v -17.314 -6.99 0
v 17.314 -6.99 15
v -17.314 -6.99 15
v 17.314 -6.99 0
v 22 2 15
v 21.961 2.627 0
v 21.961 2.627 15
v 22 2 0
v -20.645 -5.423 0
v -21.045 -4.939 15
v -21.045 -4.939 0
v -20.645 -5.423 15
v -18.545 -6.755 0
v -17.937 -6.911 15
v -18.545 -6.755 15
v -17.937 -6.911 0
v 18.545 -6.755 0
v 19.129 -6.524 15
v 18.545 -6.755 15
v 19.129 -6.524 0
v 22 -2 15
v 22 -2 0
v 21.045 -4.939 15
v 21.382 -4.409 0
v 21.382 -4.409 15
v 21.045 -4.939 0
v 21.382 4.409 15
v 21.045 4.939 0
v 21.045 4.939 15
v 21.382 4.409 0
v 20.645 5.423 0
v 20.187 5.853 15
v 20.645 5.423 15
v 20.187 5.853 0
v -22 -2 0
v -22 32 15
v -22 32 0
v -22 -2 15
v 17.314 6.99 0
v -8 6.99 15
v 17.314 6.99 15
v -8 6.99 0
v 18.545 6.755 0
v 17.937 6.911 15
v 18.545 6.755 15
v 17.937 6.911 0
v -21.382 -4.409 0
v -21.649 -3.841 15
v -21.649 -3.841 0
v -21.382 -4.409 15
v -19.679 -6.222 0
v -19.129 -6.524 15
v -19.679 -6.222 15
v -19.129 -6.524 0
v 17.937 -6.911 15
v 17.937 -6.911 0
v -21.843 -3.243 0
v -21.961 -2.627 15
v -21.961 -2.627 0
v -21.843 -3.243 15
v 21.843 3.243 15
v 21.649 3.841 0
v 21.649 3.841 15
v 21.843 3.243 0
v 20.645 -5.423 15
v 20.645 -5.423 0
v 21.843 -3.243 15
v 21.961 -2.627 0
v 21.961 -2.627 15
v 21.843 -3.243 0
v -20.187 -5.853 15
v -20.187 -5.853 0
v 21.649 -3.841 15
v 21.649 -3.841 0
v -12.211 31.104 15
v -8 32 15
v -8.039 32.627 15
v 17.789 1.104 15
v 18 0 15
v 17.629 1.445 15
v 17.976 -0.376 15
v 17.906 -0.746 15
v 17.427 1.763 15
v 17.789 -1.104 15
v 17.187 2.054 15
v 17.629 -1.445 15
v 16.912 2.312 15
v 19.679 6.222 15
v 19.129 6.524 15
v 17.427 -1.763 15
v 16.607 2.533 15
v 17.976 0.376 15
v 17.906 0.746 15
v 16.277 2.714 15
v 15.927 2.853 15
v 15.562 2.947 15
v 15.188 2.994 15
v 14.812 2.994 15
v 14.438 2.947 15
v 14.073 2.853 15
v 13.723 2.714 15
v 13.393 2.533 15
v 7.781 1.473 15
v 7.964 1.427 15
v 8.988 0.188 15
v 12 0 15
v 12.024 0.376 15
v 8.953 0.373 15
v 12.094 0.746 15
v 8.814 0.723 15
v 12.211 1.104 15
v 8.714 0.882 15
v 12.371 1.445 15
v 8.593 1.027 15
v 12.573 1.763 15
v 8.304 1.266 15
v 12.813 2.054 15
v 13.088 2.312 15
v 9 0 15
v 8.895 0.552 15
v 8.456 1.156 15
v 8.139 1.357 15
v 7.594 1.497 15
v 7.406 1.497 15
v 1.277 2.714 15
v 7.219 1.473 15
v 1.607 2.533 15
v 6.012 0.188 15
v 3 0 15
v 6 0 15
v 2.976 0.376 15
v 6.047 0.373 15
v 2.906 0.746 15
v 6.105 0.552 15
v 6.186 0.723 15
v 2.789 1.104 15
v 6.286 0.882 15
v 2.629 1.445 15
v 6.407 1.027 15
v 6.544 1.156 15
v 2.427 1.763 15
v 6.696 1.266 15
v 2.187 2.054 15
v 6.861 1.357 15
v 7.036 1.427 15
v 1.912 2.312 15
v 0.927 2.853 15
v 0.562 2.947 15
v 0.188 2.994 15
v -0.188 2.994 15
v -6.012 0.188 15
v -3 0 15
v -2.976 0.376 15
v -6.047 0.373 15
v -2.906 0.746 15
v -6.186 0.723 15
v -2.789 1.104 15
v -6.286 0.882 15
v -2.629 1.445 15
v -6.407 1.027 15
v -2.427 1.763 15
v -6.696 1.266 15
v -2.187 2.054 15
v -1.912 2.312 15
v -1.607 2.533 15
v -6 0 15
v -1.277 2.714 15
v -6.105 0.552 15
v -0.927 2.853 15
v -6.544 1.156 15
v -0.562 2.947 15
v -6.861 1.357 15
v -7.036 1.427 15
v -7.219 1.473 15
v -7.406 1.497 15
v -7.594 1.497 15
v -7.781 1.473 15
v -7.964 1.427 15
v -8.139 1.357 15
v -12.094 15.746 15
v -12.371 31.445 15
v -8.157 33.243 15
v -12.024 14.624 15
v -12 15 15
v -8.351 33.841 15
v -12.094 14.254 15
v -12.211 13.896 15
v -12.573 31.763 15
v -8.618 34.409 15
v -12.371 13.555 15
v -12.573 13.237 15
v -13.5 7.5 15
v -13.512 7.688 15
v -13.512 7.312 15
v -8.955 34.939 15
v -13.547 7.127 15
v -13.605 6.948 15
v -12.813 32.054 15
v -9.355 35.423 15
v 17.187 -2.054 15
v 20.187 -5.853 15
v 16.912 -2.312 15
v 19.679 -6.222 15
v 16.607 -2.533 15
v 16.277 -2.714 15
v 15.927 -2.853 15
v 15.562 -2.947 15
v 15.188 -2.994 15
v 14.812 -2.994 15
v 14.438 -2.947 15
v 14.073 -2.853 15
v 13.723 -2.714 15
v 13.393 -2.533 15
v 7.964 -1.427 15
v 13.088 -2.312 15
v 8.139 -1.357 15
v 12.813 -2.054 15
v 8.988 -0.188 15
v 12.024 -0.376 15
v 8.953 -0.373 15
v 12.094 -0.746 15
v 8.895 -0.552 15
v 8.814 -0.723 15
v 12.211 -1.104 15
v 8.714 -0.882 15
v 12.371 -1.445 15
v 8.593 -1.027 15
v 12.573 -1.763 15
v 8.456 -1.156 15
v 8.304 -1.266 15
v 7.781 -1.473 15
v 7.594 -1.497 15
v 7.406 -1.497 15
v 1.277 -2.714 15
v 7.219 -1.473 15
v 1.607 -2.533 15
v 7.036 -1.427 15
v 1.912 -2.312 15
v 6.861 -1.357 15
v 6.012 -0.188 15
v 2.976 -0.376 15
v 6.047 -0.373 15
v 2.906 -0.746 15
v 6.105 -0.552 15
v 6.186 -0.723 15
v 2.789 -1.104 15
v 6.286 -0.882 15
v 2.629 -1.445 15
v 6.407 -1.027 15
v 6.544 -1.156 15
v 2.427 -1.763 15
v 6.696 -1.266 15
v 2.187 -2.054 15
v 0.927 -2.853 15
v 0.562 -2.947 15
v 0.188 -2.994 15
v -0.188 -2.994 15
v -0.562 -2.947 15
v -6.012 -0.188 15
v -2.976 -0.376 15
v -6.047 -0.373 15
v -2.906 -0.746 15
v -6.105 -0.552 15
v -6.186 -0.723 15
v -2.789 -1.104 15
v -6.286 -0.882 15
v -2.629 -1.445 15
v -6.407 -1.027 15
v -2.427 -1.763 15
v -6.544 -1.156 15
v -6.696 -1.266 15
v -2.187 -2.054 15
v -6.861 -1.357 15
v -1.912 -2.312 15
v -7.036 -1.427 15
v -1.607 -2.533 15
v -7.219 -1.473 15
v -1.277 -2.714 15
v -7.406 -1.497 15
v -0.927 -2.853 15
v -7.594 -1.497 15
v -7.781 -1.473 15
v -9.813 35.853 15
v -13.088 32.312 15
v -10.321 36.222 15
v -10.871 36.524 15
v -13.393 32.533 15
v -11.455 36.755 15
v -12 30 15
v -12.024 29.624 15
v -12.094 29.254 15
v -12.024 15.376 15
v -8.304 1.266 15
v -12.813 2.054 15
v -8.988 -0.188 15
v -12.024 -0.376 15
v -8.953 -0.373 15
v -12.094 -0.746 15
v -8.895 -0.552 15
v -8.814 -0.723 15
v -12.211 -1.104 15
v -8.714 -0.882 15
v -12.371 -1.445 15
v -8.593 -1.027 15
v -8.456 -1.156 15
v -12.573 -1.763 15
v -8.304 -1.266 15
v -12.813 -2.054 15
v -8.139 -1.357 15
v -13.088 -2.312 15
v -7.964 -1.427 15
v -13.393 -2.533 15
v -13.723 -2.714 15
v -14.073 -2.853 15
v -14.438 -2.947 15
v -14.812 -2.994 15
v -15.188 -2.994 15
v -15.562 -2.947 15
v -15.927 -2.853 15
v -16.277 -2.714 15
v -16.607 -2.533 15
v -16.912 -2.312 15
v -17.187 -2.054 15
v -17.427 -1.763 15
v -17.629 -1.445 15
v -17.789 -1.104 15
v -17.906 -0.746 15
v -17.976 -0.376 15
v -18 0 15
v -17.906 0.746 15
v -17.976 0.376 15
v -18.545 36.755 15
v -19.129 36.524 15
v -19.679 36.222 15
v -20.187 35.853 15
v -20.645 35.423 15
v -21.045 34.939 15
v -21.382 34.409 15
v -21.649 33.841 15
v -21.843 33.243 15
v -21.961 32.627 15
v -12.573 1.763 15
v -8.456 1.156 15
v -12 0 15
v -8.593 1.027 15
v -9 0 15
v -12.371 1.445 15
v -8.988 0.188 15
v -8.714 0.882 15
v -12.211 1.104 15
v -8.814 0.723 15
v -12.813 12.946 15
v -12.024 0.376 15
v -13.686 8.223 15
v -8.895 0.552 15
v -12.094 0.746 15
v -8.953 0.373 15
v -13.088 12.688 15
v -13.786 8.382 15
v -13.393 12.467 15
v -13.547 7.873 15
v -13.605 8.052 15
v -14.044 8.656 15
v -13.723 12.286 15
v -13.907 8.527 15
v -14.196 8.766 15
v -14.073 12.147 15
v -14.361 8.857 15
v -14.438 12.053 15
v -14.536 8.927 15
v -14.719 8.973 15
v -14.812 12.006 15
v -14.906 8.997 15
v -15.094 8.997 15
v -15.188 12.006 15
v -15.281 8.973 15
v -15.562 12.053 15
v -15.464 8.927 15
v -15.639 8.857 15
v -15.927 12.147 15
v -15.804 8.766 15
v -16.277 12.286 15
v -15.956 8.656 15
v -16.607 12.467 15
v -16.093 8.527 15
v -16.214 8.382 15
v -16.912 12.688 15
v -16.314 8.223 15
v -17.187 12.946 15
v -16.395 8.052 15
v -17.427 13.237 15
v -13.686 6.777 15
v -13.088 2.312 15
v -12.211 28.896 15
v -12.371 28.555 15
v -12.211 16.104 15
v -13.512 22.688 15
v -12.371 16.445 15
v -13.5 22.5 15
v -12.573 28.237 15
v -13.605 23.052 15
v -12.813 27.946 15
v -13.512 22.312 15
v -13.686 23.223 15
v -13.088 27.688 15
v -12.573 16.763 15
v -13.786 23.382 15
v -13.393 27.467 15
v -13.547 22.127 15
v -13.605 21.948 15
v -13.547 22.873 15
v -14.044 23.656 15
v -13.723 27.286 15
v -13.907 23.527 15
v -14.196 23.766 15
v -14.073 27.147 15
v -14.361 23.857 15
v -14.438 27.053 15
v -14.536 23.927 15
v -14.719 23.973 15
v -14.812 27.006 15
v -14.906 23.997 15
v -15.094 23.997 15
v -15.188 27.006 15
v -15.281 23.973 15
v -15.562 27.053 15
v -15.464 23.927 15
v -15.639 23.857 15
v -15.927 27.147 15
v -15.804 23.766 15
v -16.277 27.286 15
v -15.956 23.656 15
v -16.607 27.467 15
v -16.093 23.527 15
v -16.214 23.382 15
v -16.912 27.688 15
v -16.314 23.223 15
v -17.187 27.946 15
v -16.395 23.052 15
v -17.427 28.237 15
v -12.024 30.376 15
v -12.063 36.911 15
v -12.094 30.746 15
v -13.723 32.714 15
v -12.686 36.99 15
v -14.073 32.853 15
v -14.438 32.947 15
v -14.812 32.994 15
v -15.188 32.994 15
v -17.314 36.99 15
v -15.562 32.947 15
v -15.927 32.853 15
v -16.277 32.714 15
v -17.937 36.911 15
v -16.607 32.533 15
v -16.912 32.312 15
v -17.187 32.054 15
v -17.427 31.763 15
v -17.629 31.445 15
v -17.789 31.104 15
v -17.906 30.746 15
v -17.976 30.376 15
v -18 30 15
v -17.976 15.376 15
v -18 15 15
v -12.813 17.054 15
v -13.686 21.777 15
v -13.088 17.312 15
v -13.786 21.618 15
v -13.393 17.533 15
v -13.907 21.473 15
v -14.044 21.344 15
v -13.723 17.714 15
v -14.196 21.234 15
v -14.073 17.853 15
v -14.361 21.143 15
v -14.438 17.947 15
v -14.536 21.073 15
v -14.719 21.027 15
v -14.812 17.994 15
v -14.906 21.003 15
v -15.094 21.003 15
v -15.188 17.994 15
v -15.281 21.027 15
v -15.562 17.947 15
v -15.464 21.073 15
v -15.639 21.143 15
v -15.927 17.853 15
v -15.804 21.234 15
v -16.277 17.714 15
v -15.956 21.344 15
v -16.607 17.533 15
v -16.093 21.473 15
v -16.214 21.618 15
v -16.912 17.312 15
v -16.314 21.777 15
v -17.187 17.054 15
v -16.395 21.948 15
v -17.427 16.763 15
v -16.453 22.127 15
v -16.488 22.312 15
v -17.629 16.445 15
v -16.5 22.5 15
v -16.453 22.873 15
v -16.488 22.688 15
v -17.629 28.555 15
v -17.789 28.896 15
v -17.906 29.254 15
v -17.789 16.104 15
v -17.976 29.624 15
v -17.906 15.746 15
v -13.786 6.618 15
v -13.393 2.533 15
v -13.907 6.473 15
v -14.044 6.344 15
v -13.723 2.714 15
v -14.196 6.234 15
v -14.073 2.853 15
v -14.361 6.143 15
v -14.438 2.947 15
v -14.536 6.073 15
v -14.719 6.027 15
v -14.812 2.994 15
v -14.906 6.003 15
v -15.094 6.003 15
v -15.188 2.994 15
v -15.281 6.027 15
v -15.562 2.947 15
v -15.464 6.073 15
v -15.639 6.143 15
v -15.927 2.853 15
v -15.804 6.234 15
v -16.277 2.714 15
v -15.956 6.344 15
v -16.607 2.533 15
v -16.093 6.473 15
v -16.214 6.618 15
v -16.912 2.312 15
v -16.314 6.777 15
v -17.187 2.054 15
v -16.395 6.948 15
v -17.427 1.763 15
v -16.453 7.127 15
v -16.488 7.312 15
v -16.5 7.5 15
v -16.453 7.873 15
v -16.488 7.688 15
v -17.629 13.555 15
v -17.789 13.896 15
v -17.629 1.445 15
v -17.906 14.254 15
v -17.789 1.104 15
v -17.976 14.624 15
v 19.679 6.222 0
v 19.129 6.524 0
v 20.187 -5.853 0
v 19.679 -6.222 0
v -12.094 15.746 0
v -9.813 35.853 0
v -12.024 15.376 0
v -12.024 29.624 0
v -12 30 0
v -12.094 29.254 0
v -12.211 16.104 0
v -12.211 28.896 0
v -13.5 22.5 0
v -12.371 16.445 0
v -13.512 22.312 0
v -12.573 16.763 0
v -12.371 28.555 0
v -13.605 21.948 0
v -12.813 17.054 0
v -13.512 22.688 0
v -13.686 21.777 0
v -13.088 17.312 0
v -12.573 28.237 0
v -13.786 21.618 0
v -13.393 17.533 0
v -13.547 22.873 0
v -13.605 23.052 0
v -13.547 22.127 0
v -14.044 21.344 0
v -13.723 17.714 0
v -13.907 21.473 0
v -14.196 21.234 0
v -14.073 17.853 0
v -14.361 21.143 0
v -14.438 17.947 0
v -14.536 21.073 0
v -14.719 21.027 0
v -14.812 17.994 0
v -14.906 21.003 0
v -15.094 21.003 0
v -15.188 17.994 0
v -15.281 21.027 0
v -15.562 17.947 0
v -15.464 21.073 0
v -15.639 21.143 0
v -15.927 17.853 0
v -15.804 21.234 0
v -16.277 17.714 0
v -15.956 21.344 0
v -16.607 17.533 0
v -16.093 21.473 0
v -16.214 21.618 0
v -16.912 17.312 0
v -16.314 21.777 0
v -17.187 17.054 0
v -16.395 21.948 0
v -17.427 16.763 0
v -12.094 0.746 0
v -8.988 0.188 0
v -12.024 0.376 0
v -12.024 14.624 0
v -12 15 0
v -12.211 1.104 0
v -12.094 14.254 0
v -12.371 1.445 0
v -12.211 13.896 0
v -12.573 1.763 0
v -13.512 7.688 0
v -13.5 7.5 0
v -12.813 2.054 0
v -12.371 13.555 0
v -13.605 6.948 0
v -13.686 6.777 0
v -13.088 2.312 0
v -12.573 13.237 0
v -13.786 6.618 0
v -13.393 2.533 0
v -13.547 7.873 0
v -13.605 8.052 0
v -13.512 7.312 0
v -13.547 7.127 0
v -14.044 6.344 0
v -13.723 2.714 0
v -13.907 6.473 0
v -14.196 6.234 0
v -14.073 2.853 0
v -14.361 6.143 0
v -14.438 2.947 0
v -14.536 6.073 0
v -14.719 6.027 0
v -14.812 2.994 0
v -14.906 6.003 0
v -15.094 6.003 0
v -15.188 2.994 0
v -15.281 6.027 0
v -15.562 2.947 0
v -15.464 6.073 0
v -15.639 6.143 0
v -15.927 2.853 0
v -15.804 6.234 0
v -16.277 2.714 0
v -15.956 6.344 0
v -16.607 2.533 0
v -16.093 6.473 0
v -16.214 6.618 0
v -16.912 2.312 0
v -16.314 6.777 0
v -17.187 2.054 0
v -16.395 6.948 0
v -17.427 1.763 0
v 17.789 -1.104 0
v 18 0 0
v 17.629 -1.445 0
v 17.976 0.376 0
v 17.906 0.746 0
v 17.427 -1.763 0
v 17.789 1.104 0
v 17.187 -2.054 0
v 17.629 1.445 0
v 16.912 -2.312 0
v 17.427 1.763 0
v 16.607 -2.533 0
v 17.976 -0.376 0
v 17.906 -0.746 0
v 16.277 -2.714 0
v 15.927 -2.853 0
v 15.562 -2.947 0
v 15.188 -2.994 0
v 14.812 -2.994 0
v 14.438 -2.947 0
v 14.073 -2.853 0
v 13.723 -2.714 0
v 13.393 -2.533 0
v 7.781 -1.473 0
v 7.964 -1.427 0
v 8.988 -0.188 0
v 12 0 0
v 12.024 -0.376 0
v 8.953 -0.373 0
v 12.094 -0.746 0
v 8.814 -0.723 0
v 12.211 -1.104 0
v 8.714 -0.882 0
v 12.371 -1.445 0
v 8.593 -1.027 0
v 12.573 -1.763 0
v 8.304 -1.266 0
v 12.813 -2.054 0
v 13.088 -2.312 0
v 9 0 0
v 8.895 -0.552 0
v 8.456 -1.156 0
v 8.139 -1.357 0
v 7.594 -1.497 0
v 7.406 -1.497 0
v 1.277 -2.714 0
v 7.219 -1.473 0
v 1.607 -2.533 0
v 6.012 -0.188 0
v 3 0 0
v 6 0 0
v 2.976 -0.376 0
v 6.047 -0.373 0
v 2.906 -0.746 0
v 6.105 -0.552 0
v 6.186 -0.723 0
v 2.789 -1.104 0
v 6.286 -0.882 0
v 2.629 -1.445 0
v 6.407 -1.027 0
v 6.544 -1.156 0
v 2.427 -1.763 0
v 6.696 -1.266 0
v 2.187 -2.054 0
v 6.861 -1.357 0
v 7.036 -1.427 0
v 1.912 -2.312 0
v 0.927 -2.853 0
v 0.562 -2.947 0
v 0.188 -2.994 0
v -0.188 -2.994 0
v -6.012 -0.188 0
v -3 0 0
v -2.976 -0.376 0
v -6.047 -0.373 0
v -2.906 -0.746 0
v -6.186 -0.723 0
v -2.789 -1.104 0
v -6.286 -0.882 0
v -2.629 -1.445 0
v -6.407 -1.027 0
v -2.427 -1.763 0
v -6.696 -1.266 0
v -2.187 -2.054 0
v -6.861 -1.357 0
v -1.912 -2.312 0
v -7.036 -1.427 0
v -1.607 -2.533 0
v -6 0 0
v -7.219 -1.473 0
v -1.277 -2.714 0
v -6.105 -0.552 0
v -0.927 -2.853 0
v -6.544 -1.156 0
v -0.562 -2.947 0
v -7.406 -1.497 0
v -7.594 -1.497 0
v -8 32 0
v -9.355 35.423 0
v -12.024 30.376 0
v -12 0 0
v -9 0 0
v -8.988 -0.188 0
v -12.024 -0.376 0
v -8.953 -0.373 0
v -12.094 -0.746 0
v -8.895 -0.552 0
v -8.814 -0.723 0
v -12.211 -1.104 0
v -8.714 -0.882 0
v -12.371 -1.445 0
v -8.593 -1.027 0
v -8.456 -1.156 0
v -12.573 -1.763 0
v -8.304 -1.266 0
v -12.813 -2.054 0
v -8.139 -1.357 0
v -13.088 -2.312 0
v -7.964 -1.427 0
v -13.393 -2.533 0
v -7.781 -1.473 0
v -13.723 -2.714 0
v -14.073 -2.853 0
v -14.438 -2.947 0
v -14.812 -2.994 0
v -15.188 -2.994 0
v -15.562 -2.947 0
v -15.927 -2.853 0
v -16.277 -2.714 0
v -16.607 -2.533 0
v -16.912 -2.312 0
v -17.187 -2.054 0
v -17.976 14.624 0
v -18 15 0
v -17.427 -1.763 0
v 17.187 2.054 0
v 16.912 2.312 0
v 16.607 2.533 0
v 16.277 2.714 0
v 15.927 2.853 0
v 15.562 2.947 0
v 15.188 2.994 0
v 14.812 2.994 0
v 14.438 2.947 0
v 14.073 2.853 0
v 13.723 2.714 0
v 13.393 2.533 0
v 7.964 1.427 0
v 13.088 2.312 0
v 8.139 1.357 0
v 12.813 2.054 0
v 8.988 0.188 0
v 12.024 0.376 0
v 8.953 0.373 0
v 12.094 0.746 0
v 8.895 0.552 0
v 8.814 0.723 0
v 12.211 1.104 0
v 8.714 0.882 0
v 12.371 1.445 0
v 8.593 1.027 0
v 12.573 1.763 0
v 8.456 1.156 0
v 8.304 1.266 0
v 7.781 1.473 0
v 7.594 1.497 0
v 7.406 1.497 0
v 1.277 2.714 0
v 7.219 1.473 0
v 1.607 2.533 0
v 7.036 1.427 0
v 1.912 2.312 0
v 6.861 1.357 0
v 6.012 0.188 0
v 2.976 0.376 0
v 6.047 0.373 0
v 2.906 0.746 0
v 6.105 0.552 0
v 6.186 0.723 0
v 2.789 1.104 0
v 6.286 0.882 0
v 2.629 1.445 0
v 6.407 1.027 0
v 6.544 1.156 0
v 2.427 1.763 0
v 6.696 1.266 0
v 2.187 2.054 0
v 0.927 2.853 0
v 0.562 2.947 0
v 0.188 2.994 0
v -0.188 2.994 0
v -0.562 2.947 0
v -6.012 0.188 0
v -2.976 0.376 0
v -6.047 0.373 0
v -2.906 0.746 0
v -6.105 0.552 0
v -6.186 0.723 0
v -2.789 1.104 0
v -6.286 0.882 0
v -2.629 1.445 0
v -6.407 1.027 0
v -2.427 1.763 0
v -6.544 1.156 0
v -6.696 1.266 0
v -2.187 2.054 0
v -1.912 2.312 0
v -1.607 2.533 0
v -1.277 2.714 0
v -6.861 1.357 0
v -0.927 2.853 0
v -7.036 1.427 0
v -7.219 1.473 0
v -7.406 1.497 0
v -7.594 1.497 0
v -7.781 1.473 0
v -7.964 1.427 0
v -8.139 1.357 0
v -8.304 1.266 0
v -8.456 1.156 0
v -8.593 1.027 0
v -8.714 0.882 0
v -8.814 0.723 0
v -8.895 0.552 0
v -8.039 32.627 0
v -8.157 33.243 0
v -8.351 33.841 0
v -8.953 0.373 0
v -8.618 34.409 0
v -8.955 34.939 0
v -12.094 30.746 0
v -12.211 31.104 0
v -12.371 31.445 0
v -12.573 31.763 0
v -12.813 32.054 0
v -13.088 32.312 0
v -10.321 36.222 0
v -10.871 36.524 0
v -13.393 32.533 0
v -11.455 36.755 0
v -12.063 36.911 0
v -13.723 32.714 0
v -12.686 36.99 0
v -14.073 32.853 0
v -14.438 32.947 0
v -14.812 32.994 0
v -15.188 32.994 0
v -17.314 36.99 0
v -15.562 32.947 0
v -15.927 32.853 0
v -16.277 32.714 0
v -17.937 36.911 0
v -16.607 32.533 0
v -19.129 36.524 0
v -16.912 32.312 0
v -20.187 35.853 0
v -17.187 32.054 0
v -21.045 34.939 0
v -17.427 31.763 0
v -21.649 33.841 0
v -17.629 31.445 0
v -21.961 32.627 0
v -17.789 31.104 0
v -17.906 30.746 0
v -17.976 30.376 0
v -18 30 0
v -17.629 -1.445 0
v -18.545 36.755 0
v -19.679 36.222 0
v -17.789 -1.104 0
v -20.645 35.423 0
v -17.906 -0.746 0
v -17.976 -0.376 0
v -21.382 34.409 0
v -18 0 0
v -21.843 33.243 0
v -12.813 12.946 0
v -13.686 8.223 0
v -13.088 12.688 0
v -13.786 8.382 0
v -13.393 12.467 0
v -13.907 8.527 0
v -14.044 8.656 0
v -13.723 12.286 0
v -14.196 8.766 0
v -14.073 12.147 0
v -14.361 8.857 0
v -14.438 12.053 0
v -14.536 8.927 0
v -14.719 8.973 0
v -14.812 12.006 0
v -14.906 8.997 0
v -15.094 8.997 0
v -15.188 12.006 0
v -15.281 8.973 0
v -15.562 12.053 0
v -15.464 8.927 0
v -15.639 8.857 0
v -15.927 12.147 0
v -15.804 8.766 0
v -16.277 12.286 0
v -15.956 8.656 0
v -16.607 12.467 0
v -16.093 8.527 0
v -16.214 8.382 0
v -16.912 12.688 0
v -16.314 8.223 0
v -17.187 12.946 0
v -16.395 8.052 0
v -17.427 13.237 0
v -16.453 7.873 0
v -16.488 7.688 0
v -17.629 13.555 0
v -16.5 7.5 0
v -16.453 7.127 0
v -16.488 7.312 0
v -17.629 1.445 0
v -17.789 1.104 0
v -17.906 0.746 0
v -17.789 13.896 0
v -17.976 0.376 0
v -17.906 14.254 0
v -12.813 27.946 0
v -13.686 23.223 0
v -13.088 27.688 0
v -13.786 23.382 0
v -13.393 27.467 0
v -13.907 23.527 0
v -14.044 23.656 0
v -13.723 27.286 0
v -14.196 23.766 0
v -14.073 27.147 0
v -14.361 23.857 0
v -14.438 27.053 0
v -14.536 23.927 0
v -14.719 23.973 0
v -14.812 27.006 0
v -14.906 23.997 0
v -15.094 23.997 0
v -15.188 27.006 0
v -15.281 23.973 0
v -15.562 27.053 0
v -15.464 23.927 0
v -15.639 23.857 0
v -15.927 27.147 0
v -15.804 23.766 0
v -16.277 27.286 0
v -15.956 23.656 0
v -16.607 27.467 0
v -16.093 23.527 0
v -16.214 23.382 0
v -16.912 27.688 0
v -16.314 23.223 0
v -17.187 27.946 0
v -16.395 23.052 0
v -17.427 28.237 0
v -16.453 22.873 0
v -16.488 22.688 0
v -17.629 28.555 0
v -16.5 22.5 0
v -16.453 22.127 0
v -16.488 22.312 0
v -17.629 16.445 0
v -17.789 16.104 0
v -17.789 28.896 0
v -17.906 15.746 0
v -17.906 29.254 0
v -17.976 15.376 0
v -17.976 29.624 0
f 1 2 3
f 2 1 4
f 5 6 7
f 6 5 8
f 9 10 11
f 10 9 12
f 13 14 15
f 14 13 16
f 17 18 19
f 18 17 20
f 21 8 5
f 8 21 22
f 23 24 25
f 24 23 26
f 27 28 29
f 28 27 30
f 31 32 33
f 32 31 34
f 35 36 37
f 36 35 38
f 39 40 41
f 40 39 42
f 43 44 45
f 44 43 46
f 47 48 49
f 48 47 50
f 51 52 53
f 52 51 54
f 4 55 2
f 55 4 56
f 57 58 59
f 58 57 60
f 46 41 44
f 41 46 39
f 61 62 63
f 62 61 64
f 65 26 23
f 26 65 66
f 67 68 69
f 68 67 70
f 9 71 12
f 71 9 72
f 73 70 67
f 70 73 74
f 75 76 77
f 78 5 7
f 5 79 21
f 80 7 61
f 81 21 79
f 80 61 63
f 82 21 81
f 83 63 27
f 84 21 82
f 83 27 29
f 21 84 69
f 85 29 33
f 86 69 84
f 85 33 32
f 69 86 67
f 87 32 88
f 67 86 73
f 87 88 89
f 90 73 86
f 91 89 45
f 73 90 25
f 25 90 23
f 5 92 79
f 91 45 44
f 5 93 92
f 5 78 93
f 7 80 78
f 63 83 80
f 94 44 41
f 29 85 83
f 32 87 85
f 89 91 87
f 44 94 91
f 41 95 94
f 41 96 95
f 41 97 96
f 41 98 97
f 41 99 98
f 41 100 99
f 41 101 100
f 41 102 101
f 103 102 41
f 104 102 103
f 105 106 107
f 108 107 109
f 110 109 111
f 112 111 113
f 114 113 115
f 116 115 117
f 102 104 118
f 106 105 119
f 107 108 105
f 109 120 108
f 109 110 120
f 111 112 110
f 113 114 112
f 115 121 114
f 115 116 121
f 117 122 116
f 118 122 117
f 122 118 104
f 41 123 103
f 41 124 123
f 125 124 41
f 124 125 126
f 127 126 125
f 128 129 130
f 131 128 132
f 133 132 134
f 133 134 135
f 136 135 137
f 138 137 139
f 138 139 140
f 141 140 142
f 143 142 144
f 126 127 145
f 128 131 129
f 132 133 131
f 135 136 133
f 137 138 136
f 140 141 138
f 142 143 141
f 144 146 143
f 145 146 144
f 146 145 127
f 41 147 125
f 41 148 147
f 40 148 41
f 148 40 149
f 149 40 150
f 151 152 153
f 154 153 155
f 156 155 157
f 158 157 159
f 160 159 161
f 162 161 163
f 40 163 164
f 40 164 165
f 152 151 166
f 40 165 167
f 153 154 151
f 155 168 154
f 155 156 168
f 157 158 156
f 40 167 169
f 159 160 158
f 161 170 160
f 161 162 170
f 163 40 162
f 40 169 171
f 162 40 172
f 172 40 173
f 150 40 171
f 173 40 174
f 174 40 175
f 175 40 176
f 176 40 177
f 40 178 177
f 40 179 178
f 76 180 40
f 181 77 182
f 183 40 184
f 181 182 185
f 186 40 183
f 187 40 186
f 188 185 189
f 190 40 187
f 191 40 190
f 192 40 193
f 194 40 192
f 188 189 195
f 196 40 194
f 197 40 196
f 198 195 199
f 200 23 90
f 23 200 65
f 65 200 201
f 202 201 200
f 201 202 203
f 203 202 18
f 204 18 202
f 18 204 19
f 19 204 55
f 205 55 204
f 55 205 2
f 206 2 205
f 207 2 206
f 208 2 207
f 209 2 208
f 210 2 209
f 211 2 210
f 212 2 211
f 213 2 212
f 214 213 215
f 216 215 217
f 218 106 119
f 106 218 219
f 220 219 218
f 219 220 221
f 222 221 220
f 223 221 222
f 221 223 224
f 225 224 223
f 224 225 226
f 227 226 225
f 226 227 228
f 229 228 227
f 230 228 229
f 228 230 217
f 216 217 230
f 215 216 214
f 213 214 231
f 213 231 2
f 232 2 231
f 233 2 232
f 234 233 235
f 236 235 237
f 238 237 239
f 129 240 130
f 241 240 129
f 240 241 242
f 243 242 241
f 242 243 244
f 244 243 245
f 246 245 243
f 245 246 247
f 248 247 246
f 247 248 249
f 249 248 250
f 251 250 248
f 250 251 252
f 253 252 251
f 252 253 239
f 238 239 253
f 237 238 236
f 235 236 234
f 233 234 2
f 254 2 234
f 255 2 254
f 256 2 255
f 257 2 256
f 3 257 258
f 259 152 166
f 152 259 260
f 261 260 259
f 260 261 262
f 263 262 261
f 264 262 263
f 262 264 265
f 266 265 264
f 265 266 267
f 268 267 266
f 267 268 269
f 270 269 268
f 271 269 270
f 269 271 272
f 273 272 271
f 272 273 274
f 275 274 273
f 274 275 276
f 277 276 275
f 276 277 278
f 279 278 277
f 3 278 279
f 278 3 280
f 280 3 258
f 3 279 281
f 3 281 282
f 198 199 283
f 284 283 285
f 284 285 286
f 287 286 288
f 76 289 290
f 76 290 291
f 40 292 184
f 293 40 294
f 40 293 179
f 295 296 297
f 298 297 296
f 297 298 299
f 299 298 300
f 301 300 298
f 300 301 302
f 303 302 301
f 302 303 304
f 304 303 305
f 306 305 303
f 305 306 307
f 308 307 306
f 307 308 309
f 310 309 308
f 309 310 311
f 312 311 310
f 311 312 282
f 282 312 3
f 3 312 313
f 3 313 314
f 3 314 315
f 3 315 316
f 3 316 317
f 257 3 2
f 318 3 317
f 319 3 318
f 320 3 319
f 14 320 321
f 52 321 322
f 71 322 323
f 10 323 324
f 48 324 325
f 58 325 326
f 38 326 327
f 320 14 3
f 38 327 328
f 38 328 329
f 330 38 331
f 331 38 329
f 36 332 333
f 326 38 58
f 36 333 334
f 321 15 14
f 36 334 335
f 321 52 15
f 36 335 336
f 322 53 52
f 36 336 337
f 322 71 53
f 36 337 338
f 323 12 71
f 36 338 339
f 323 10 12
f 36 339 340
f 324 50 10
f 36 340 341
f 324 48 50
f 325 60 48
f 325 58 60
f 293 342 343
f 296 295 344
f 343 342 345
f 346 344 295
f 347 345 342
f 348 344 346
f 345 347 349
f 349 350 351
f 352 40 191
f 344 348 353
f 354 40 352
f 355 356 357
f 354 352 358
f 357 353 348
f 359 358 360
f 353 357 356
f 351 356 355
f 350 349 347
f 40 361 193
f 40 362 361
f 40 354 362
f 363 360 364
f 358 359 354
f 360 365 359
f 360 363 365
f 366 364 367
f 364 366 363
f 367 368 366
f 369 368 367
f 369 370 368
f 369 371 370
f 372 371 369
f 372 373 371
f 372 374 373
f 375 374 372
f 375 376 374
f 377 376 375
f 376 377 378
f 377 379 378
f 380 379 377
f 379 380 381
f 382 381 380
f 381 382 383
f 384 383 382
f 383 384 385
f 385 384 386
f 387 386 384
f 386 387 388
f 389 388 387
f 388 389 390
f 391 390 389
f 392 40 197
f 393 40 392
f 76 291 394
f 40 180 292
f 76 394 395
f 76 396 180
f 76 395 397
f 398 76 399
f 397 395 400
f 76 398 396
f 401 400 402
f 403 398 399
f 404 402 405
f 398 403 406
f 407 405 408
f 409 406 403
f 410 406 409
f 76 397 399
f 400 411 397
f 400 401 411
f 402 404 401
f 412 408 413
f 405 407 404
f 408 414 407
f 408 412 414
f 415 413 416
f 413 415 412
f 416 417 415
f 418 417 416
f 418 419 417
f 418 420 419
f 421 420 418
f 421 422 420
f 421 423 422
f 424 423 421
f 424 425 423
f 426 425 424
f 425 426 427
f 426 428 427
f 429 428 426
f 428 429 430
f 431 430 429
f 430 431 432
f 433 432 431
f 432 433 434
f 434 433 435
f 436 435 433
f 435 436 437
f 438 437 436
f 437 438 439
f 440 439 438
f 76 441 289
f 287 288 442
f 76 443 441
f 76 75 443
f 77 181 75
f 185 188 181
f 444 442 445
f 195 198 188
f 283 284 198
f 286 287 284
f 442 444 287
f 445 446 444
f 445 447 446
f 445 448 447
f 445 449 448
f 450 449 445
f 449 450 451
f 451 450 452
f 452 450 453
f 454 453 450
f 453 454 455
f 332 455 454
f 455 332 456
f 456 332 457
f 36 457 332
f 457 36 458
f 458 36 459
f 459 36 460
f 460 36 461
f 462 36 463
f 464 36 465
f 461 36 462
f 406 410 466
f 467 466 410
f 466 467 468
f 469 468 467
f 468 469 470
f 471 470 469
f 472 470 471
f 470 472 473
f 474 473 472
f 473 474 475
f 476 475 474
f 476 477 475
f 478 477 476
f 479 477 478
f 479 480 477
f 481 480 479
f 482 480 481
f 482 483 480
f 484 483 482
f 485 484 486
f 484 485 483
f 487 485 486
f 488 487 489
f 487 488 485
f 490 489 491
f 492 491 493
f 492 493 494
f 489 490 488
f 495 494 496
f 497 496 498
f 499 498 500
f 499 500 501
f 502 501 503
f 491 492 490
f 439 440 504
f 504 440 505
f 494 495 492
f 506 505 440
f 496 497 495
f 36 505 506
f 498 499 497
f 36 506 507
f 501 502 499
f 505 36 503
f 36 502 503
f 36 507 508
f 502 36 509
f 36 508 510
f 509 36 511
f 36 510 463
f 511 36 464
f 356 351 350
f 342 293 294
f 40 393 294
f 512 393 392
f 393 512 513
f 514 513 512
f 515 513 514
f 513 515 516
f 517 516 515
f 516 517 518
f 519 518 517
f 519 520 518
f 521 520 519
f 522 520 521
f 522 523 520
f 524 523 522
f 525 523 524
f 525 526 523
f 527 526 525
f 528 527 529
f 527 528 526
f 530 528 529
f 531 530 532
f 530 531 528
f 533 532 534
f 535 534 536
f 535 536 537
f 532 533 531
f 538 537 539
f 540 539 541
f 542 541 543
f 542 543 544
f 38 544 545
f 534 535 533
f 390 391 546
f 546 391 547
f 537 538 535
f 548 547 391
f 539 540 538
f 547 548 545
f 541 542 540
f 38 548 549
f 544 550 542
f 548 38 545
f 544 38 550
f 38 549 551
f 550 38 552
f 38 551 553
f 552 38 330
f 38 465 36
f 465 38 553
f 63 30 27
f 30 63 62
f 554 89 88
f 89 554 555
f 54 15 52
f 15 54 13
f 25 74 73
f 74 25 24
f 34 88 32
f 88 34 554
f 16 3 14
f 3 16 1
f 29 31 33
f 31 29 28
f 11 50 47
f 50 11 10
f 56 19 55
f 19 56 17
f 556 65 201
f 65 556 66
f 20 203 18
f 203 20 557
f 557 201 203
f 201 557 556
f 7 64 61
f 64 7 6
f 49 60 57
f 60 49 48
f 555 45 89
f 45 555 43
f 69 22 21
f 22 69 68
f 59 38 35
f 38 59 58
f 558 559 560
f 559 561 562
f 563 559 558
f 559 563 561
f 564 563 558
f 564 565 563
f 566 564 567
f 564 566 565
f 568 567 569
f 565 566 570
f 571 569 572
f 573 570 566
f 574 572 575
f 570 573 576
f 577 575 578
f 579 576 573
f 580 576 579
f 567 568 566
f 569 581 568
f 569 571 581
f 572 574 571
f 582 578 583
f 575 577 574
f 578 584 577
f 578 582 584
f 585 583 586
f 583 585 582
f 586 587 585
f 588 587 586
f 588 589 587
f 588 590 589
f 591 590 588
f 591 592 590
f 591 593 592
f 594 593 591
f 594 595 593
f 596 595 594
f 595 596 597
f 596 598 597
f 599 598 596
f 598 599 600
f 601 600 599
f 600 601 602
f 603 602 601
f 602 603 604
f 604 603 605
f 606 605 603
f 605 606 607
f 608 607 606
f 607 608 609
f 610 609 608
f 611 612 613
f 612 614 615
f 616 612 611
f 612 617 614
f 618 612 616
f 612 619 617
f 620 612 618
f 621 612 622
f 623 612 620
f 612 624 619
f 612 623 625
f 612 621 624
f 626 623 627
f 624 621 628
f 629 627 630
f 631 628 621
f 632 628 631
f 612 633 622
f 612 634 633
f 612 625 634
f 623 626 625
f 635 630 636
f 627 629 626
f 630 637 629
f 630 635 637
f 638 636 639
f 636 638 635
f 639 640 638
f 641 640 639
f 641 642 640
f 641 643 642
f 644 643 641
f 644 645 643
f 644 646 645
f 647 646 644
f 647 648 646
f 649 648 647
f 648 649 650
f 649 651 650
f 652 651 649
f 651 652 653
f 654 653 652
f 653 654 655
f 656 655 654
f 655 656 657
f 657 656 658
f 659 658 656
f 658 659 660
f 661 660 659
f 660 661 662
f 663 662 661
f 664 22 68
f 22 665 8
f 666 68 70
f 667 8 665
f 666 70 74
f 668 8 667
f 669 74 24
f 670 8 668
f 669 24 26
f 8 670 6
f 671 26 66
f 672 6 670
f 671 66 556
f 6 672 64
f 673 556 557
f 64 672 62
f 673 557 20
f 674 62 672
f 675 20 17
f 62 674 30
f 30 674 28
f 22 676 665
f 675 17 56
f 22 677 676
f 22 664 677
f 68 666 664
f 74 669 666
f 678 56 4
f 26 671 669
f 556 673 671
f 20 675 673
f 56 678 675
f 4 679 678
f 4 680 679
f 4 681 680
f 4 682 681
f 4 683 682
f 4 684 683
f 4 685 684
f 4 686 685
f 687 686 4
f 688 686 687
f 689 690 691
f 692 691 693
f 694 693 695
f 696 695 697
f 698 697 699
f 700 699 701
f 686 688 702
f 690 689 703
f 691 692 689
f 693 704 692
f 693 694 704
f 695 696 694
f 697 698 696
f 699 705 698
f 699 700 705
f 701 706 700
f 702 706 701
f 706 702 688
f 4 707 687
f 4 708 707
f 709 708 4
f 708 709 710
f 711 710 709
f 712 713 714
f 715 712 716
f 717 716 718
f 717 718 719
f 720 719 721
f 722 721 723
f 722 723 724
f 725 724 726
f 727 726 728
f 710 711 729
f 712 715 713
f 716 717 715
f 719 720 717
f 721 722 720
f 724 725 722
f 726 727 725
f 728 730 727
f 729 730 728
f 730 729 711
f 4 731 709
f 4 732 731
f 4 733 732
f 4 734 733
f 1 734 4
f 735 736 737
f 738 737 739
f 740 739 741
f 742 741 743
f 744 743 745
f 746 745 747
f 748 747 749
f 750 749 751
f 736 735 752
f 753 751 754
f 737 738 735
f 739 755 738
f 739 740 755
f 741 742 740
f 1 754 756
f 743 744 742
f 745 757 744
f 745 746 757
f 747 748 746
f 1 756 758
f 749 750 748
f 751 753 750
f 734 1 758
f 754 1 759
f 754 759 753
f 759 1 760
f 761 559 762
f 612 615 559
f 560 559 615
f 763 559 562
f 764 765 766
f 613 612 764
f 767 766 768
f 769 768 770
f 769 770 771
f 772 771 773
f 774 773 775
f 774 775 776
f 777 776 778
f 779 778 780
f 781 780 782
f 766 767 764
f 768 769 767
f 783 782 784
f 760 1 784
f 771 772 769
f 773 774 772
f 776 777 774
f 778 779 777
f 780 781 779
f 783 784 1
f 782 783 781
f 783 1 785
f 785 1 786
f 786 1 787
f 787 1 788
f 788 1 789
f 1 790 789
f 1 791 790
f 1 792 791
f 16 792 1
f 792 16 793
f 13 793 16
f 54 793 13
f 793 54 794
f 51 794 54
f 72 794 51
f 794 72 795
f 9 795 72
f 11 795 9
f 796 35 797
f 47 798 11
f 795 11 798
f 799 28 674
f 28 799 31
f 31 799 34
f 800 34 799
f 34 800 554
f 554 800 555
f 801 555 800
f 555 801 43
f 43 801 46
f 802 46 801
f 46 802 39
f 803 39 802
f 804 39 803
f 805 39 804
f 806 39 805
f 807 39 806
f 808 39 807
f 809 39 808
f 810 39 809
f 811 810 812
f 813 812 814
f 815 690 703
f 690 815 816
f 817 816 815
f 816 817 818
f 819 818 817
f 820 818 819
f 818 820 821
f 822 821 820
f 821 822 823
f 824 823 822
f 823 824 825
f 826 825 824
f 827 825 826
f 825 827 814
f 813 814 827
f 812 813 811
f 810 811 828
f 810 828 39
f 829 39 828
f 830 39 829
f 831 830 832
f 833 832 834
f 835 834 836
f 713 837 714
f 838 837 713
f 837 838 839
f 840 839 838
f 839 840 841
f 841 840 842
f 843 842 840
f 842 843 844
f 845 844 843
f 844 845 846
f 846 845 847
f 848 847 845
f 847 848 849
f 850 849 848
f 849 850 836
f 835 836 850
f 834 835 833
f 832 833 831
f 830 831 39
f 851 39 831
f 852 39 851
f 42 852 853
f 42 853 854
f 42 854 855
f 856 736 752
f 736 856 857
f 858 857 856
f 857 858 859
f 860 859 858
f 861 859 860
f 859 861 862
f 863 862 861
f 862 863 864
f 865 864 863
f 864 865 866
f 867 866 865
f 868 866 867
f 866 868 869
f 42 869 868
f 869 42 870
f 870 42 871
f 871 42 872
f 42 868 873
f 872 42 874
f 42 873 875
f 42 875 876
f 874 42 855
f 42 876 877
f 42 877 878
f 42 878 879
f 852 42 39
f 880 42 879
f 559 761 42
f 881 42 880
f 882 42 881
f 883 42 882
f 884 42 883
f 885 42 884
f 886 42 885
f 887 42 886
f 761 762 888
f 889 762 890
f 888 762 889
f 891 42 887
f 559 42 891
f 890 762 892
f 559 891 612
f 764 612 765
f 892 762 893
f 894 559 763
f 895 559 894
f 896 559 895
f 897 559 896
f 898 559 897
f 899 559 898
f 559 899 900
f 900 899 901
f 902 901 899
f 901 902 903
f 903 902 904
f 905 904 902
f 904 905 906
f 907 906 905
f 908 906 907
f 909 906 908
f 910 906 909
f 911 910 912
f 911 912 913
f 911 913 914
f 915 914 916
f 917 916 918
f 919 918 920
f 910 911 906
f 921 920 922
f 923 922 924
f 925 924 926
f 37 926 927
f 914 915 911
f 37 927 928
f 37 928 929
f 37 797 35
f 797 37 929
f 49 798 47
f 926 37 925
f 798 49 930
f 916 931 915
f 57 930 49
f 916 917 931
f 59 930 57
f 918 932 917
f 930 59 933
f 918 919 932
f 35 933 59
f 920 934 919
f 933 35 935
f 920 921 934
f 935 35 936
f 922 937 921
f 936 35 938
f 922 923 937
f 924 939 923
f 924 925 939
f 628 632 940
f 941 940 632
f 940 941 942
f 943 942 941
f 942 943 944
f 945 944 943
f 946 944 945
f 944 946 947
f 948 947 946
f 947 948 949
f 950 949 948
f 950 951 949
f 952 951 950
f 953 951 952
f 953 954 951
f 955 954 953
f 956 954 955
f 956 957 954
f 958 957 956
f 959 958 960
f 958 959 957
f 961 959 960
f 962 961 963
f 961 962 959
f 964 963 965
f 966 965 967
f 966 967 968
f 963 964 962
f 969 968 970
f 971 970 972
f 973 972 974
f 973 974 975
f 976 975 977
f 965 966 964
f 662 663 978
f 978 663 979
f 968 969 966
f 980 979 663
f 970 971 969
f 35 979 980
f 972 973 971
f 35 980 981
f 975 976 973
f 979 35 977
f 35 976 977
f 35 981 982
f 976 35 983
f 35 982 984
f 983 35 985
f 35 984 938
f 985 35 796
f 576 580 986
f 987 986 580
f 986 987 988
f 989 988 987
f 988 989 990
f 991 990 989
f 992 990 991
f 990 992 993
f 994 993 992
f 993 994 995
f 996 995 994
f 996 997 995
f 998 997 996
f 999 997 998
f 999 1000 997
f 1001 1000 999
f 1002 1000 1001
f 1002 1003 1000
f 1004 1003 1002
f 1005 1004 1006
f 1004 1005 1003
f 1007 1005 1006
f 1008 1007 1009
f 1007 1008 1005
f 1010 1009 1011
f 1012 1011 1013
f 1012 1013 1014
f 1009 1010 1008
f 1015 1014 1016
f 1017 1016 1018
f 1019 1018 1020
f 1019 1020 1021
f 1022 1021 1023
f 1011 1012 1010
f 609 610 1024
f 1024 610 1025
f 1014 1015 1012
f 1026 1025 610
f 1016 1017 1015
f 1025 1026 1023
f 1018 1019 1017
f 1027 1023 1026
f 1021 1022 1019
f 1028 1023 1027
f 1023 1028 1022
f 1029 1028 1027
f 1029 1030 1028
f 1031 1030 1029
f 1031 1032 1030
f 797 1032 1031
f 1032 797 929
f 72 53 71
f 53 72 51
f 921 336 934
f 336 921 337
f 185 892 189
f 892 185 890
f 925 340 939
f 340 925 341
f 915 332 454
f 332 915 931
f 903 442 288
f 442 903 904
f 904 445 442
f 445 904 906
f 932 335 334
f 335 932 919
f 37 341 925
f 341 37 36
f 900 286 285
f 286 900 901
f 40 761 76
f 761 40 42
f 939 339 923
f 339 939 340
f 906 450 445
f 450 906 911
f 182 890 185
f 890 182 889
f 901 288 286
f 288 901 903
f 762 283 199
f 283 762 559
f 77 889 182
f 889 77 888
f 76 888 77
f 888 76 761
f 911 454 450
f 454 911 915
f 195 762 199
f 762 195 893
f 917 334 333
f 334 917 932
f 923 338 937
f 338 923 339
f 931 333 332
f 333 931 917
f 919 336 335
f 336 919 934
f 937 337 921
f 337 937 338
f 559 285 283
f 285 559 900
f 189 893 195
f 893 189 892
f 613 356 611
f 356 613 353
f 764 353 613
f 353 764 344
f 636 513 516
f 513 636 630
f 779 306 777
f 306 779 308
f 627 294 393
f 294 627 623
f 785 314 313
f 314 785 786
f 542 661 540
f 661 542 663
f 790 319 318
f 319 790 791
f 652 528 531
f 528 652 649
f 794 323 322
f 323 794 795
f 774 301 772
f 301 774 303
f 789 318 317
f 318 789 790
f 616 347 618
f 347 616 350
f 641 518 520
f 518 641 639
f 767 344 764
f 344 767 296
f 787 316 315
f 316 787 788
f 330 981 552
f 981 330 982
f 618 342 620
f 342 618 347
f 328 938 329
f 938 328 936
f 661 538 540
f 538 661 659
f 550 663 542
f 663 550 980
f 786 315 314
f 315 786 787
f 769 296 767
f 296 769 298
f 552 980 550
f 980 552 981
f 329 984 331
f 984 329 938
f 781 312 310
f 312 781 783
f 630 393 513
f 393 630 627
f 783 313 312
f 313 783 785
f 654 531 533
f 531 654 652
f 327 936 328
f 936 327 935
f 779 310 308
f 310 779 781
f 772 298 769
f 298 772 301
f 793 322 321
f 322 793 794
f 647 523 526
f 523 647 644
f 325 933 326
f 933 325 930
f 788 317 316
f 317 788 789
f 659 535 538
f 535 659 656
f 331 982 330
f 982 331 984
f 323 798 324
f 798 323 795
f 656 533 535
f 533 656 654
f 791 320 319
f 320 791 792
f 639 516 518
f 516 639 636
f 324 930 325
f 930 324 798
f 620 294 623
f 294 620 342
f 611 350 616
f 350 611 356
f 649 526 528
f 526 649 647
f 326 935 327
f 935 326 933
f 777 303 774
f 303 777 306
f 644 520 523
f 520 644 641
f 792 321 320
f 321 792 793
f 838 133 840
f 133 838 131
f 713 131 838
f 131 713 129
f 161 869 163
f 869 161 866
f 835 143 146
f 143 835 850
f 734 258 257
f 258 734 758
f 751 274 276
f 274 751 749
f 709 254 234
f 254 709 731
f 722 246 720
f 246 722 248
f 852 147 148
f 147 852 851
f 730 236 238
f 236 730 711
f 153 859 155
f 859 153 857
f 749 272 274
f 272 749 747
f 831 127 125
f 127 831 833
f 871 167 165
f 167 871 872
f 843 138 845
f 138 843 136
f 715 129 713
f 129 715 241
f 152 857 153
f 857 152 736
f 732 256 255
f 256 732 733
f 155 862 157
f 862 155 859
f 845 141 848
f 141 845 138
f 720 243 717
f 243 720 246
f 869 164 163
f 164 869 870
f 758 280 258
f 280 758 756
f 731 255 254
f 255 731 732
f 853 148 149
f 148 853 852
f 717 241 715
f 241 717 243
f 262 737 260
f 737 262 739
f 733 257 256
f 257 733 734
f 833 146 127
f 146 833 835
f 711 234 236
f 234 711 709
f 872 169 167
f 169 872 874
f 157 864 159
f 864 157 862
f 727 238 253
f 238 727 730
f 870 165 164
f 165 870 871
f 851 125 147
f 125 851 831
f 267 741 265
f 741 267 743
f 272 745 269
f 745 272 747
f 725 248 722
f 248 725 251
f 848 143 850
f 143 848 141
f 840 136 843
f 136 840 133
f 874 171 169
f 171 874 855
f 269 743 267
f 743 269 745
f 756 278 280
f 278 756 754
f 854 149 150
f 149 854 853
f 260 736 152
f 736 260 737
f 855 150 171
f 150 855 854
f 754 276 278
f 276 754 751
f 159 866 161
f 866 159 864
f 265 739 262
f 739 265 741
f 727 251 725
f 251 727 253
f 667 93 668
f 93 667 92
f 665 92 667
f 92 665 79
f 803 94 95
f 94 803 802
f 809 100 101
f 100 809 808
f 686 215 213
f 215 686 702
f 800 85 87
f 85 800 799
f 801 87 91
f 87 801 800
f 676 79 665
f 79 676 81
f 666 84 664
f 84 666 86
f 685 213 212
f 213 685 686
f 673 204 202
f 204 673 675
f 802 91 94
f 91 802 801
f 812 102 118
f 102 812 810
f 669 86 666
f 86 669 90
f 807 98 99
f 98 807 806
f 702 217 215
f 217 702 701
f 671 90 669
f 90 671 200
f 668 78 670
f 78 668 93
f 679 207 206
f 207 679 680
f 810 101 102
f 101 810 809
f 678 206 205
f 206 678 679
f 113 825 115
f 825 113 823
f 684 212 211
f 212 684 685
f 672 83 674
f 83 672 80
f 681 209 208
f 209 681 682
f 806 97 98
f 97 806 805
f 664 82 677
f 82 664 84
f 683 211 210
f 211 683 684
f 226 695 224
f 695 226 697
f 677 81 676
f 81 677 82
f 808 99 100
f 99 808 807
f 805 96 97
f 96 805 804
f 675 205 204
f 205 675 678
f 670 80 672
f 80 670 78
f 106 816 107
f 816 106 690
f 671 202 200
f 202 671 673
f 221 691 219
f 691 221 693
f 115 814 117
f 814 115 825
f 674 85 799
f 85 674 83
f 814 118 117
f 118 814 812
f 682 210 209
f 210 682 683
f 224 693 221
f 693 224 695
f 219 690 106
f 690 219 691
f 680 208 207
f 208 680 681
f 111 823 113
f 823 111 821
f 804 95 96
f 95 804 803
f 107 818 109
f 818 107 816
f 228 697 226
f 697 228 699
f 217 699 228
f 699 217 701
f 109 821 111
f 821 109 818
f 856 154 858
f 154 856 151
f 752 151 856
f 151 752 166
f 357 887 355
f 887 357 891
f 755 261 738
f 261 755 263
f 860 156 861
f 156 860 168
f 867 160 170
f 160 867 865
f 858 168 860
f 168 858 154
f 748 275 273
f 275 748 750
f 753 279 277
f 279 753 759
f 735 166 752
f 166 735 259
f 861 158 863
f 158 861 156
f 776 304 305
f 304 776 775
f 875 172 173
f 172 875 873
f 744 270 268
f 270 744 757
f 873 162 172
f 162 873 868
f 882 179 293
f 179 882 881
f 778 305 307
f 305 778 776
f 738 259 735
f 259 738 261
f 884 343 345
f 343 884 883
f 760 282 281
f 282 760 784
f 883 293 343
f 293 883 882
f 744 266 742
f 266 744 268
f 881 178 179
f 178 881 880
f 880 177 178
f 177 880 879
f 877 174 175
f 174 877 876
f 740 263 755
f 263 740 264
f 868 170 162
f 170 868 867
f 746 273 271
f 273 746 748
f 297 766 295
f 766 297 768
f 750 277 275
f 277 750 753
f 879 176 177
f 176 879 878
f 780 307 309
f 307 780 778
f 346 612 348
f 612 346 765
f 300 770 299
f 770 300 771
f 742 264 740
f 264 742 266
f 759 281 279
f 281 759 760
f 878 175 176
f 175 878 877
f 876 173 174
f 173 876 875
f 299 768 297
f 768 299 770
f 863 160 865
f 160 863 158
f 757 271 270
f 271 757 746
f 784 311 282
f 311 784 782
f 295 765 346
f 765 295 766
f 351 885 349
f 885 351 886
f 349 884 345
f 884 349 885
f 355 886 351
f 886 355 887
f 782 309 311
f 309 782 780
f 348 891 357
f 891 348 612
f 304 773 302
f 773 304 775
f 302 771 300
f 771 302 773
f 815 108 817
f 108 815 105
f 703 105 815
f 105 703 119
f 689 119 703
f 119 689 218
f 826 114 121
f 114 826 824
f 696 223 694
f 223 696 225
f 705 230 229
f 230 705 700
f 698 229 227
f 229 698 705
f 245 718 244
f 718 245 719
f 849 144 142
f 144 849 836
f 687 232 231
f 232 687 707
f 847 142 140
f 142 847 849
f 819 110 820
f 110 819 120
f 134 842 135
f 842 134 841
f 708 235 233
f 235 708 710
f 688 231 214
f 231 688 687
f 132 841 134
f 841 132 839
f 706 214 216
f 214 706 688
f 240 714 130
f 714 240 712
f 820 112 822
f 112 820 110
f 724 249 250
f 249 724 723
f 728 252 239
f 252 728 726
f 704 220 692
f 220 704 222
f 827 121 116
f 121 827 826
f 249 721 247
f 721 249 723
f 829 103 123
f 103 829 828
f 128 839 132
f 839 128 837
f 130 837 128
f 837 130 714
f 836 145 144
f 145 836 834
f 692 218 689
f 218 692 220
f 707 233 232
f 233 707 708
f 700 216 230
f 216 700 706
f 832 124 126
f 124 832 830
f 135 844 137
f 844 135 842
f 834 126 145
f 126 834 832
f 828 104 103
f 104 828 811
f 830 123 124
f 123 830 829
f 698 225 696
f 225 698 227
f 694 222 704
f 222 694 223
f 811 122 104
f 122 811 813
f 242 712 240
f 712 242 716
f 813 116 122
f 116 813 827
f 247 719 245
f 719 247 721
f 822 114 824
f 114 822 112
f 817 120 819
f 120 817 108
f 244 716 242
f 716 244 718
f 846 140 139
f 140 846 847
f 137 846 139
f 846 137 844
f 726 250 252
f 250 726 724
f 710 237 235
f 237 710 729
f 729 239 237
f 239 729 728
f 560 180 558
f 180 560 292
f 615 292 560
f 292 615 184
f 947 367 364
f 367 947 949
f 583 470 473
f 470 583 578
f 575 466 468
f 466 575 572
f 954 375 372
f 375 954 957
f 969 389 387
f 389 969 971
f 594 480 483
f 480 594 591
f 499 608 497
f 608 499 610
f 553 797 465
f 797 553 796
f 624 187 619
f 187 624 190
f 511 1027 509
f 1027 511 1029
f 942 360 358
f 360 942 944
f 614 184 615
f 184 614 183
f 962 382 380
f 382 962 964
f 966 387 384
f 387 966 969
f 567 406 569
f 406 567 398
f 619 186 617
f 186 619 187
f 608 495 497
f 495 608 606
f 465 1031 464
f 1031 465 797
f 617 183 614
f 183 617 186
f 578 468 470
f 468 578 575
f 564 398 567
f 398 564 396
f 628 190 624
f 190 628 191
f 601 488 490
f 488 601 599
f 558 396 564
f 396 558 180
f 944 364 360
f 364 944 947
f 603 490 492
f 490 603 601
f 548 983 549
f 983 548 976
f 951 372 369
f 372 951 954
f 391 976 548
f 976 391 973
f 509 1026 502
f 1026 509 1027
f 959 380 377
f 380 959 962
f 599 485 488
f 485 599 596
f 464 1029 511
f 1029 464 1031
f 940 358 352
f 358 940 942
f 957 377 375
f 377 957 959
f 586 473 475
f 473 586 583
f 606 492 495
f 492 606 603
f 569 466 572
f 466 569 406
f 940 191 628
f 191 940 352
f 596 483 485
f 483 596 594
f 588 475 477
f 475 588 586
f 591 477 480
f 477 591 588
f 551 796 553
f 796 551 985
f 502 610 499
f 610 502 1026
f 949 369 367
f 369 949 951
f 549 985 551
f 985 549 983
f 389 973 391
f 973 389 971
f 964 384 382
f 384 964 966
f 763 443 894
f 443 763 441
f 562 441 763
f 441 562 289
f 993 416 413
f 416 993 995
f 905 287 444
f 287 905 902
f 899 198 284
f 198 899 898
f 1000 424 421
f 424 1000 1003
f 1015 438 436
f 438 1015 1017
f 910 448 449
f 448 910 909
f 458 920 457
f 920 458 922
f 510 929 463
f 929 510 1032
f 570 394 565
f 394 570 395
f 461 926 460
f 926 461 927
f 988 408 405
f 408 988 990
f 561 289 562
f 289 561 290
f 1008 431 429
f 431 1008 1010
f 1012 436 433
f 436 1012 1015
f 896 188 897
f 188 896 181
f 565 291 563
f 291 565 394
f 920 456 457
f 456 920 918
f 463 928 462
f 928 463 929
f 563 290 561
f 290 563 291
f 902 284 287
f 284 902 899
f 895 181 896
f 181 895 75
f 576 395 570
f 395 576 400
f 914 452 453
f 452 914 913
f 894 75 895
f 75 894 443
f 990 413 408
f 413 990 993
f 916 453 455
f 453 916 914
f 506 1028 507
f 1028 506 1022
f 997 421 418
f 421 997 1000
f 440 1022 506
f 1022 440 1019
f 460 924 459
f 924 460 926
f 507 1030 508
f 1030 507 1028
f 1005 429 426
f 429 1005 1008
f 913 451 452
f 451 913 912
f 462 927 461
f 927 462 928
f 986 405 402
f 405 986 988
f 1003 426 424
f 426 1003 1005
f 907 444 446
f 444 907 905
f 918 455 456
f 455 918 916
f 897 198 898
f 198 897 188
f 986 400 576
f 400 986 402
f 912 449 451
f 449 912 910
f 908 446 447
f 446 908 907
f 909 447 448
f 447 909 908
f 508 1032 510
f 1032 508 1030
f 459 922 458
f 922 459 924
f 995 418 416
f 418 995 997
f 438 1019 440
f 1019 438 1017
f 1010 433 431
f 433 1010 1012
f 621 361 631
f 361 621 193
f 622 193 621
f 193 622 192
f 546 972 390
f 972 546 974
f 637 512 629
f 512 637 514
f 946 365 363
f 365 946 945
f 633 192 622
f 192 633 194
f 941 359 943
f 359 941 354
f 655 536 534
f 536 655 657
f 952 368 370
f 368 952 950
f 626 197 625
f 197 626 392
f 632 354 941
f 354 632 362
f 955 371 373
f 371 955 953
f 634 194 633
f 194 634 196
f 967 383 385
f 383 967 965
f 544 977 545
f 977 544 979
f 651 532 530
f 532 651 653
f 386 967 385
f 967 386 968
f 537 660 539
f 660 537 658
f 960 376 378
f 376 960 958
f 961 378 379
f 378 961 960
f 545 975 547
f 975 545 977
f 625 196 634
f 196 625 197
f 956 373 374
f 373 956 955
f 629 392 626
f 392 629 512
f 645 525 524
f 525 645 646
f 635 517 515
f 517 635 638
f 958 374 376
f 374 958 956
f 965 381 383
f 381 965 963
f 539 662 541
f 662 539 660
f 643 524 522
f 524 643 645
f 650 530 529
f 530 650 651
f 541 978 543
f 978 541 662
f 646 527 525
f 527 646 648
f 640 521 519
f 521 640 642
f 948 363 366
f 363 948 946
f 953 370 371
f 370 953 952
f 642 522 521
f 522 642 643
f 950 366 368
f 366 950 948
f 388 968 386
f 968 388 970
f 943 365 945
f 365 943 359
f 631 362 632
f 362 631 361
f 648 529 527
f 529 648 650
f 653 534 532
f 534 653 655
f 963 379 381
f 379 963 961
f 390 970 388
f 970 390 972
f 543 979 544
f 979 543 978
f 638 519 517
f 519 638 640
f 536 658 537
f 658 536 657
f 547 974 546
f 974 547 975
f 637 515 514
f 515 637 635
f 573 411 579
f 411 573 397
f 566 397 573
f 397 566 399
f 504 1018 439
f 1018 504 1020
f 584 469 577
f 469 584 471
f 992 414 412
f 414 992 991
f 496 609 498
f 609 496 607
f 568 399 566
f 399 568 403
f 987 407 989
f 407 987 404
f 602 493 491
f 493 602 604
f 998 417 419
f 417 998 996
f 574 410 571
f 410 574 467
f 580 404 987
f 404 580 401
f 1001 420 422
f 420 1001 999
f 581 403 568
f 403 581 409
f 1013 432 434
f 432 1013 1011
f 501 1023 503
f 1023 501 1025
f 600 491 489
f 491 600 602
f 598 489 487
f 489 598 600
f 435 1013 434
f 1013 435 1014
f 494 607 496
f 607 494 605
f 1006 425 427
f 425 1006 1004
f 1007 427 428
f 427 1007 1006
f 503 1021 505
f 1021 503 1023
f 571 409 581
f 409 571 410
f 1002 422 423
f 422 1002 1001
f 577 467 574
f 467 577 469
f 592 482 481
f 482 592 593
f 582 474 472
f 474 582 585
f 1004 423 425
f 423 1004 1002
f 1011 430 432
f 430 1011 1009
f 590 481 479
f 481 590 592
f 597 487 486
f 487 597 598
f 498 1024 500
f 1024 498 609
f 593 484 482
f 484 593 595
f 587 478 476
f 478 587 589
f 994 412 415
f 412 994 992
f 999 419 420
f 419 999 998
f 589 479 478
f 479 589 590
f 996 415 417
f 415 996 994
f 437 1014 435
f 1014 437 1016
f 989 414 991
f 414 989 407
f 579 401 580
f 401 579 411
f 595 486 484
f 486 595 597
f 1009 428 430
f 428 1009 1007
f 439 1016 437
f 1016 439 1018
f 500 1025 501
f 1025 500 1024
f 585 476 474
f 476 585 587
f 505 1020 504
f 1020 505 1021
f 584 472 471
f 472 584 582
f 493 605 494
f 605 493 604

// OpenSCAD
$fn = 50;


difference() {
	union() {
		*color(alpha = 1.0000000000, c = "gray") {
			translate(v = [0, 7, 0]) {
				linear_extrude(height = 1) {
					text(font = "Arial:style=Bold", halign = "center", size = 4.5000000000, text = "COMMENT plate main", valign = "center");
				}
			}
		}
		hull() {
			translate(v = [-17.0000000000, 2.0000000000, 0]) {
				cylinder(h = 15, r = 5);
			}
			translate(v = [17.0000000000, 2.0000000000, 0]) {
				cylinder(h = 15, r = 5);
			}
			translate(v = [-17.0000000000, -2.0000000000, 0]) {
				cylinder(h = 15, r = 5);
			}
			translate(v = [17.0000000000, -2.0000000000, 0]) {
				cylinder(h = 15, r = 5);
			}
		}
		*color(alpha = 1.0000000000, c = "gray") {
			translate(v = [0, 7, 0]) {
				linear_extrude(height = 1) {
					text(font = "Arial:style=Bold", halign = "center", size = 4.5000000000, text = "COMMENT plate main", valign = "center");
				}
			}
		}
		translate(v = [-15.0000000000, 15.0000000000, 0]) {
			hull() {
				translate(v = [-2.0000000000, 17.0000000000, 0]) {
					cylinder(h = 15, r = 5);
				}
				translate(v = [2.0000000000, 17.0000000000, 0]) {
					cylinder(h = 15, r = 5);
				}
				translate(v = [-2.0000000000, -17.0000000000, 0]) {
					cylinder(h = 15, r = 5);
				}
				translate(v = [2.0000000000, -17.0000000000, 0]) {
					cylinder(h = 15, r = 5);
				}
			}
		}
	}
	union() {
		*color(alpha = 1.0000000000, c = "gray") {
			translate(v = [0, 7, 0]) {
				linear_extrude(height = 1) {
					text(font = "Arial:style=Bold", halign = "center", size = 4.5000000000, text = "COMMENT holes main", valign = "center");
				}
			}
		}
		translate(v = [-15.0000000000, 0.0000000000, 0]) {
			translate(v = [0, 0, -100]) {
				cylinder(h = 200, r = 3.0000000000);
			}
		}
		translate(v = [0, 0, -100]) {
			cylinder(h = 200, r = 3.0000000000);
		}
		translate(v = [15.0000000000, 0.0000000000, 0]) {
			translate(v = [0, 0, -100]) {
				cylinder(h = 200, r = 3.0000000000);
			}
		}
		translate(v = [-15.0000000000, 0.0000000000, 0]) {
			translate(v = [0, 0, -100]) {
				cylinder(h = 200, r = 1.5000000000);
			}
		}
		translate(v = [-7.5000000000, 0.0000000000, 0]) {
			translate(v = [0, 0, -100]) {
				cylinder(h = 200, r = 1.5000000000);
			}
		}
		translate(v = [0, 0, -100]) {
			cylinder(h = 200, r = 1.5000000000);
		}
		translate(v = [7.5000000000, 0.0000000000, 0]) {
			translate(v = [0, 0, -100]) {
				cylinder(h = 200, r = 1.5000000000);
			}
		}
		translate(v = [15.0000000000, 0.0000000000, 0]) {
			translate(v = [0, 0, -100]) {
				cylinder(h = 200, r = 1.5000000000);
			}
		}
		*color(alpha = 1.0000000000, c = "gray") {
			translate(v = [0, 7, 0]) {
				linear_extrude(height = 1) {
					text(font = "Arial:style=Bold", halign = "center", size = 4.5000000000, text = "COMMENT holes main", valign = "center");
				}
			}
		}
		translate(v = [-15.0000000000, 0.0000000000, 0]) {
			translate(v = [0, 0, -100]) {
				cylinder(h = 200, r = 3.0000000000);
			}
		}
		translate(v = [-15.0000000000, 15.0000000000, 0]) {
			translate(v = [0, 0, -100]) {
				cylinder(h = 200, r = 3.0000000000);
			}
		}
		translate(v = [-15.0000000000, 30.0000000000, 0]) {
			translate(v = [0, 0, -100]) {
				cylinder(h = 200, r = 3.0000000000);
			}
		}
		translate(v = [-15.0000000000, 0.0000000000, 0]) {
			translate(v = [0, 0, -100]) {
				cylinder(h = 200, r = 1.5000000000);
			}
		}
		translate(v = [-15.0000000000, 7.5000000000, 0]) {
			translate(v = [0, 0, -100]) {
				cylinder(h = 200, r = 1.5000000000);
			}
		}
		translate(v = [-15.0000000000, 15.0000000000, 0]) {
			translate(v = [0, 0, -100]) {
				cylinder(h = 200, r = 1.5000000000);
			}
		}
		translate(v = [-15.0000000000, 22.5000000000, 0]) {
			translate(v = [0, 0, -100]) {
				cylinder(h = 200, r = 1.5000000000);
			}
		}
		translate(v = [-15.0000000000, 30.0000000000, 0]) {
			translate(v = [0, 0, -100]) {
				cylinder(h = 200, r = 1.5000000000);
			}
		}
	}
}
